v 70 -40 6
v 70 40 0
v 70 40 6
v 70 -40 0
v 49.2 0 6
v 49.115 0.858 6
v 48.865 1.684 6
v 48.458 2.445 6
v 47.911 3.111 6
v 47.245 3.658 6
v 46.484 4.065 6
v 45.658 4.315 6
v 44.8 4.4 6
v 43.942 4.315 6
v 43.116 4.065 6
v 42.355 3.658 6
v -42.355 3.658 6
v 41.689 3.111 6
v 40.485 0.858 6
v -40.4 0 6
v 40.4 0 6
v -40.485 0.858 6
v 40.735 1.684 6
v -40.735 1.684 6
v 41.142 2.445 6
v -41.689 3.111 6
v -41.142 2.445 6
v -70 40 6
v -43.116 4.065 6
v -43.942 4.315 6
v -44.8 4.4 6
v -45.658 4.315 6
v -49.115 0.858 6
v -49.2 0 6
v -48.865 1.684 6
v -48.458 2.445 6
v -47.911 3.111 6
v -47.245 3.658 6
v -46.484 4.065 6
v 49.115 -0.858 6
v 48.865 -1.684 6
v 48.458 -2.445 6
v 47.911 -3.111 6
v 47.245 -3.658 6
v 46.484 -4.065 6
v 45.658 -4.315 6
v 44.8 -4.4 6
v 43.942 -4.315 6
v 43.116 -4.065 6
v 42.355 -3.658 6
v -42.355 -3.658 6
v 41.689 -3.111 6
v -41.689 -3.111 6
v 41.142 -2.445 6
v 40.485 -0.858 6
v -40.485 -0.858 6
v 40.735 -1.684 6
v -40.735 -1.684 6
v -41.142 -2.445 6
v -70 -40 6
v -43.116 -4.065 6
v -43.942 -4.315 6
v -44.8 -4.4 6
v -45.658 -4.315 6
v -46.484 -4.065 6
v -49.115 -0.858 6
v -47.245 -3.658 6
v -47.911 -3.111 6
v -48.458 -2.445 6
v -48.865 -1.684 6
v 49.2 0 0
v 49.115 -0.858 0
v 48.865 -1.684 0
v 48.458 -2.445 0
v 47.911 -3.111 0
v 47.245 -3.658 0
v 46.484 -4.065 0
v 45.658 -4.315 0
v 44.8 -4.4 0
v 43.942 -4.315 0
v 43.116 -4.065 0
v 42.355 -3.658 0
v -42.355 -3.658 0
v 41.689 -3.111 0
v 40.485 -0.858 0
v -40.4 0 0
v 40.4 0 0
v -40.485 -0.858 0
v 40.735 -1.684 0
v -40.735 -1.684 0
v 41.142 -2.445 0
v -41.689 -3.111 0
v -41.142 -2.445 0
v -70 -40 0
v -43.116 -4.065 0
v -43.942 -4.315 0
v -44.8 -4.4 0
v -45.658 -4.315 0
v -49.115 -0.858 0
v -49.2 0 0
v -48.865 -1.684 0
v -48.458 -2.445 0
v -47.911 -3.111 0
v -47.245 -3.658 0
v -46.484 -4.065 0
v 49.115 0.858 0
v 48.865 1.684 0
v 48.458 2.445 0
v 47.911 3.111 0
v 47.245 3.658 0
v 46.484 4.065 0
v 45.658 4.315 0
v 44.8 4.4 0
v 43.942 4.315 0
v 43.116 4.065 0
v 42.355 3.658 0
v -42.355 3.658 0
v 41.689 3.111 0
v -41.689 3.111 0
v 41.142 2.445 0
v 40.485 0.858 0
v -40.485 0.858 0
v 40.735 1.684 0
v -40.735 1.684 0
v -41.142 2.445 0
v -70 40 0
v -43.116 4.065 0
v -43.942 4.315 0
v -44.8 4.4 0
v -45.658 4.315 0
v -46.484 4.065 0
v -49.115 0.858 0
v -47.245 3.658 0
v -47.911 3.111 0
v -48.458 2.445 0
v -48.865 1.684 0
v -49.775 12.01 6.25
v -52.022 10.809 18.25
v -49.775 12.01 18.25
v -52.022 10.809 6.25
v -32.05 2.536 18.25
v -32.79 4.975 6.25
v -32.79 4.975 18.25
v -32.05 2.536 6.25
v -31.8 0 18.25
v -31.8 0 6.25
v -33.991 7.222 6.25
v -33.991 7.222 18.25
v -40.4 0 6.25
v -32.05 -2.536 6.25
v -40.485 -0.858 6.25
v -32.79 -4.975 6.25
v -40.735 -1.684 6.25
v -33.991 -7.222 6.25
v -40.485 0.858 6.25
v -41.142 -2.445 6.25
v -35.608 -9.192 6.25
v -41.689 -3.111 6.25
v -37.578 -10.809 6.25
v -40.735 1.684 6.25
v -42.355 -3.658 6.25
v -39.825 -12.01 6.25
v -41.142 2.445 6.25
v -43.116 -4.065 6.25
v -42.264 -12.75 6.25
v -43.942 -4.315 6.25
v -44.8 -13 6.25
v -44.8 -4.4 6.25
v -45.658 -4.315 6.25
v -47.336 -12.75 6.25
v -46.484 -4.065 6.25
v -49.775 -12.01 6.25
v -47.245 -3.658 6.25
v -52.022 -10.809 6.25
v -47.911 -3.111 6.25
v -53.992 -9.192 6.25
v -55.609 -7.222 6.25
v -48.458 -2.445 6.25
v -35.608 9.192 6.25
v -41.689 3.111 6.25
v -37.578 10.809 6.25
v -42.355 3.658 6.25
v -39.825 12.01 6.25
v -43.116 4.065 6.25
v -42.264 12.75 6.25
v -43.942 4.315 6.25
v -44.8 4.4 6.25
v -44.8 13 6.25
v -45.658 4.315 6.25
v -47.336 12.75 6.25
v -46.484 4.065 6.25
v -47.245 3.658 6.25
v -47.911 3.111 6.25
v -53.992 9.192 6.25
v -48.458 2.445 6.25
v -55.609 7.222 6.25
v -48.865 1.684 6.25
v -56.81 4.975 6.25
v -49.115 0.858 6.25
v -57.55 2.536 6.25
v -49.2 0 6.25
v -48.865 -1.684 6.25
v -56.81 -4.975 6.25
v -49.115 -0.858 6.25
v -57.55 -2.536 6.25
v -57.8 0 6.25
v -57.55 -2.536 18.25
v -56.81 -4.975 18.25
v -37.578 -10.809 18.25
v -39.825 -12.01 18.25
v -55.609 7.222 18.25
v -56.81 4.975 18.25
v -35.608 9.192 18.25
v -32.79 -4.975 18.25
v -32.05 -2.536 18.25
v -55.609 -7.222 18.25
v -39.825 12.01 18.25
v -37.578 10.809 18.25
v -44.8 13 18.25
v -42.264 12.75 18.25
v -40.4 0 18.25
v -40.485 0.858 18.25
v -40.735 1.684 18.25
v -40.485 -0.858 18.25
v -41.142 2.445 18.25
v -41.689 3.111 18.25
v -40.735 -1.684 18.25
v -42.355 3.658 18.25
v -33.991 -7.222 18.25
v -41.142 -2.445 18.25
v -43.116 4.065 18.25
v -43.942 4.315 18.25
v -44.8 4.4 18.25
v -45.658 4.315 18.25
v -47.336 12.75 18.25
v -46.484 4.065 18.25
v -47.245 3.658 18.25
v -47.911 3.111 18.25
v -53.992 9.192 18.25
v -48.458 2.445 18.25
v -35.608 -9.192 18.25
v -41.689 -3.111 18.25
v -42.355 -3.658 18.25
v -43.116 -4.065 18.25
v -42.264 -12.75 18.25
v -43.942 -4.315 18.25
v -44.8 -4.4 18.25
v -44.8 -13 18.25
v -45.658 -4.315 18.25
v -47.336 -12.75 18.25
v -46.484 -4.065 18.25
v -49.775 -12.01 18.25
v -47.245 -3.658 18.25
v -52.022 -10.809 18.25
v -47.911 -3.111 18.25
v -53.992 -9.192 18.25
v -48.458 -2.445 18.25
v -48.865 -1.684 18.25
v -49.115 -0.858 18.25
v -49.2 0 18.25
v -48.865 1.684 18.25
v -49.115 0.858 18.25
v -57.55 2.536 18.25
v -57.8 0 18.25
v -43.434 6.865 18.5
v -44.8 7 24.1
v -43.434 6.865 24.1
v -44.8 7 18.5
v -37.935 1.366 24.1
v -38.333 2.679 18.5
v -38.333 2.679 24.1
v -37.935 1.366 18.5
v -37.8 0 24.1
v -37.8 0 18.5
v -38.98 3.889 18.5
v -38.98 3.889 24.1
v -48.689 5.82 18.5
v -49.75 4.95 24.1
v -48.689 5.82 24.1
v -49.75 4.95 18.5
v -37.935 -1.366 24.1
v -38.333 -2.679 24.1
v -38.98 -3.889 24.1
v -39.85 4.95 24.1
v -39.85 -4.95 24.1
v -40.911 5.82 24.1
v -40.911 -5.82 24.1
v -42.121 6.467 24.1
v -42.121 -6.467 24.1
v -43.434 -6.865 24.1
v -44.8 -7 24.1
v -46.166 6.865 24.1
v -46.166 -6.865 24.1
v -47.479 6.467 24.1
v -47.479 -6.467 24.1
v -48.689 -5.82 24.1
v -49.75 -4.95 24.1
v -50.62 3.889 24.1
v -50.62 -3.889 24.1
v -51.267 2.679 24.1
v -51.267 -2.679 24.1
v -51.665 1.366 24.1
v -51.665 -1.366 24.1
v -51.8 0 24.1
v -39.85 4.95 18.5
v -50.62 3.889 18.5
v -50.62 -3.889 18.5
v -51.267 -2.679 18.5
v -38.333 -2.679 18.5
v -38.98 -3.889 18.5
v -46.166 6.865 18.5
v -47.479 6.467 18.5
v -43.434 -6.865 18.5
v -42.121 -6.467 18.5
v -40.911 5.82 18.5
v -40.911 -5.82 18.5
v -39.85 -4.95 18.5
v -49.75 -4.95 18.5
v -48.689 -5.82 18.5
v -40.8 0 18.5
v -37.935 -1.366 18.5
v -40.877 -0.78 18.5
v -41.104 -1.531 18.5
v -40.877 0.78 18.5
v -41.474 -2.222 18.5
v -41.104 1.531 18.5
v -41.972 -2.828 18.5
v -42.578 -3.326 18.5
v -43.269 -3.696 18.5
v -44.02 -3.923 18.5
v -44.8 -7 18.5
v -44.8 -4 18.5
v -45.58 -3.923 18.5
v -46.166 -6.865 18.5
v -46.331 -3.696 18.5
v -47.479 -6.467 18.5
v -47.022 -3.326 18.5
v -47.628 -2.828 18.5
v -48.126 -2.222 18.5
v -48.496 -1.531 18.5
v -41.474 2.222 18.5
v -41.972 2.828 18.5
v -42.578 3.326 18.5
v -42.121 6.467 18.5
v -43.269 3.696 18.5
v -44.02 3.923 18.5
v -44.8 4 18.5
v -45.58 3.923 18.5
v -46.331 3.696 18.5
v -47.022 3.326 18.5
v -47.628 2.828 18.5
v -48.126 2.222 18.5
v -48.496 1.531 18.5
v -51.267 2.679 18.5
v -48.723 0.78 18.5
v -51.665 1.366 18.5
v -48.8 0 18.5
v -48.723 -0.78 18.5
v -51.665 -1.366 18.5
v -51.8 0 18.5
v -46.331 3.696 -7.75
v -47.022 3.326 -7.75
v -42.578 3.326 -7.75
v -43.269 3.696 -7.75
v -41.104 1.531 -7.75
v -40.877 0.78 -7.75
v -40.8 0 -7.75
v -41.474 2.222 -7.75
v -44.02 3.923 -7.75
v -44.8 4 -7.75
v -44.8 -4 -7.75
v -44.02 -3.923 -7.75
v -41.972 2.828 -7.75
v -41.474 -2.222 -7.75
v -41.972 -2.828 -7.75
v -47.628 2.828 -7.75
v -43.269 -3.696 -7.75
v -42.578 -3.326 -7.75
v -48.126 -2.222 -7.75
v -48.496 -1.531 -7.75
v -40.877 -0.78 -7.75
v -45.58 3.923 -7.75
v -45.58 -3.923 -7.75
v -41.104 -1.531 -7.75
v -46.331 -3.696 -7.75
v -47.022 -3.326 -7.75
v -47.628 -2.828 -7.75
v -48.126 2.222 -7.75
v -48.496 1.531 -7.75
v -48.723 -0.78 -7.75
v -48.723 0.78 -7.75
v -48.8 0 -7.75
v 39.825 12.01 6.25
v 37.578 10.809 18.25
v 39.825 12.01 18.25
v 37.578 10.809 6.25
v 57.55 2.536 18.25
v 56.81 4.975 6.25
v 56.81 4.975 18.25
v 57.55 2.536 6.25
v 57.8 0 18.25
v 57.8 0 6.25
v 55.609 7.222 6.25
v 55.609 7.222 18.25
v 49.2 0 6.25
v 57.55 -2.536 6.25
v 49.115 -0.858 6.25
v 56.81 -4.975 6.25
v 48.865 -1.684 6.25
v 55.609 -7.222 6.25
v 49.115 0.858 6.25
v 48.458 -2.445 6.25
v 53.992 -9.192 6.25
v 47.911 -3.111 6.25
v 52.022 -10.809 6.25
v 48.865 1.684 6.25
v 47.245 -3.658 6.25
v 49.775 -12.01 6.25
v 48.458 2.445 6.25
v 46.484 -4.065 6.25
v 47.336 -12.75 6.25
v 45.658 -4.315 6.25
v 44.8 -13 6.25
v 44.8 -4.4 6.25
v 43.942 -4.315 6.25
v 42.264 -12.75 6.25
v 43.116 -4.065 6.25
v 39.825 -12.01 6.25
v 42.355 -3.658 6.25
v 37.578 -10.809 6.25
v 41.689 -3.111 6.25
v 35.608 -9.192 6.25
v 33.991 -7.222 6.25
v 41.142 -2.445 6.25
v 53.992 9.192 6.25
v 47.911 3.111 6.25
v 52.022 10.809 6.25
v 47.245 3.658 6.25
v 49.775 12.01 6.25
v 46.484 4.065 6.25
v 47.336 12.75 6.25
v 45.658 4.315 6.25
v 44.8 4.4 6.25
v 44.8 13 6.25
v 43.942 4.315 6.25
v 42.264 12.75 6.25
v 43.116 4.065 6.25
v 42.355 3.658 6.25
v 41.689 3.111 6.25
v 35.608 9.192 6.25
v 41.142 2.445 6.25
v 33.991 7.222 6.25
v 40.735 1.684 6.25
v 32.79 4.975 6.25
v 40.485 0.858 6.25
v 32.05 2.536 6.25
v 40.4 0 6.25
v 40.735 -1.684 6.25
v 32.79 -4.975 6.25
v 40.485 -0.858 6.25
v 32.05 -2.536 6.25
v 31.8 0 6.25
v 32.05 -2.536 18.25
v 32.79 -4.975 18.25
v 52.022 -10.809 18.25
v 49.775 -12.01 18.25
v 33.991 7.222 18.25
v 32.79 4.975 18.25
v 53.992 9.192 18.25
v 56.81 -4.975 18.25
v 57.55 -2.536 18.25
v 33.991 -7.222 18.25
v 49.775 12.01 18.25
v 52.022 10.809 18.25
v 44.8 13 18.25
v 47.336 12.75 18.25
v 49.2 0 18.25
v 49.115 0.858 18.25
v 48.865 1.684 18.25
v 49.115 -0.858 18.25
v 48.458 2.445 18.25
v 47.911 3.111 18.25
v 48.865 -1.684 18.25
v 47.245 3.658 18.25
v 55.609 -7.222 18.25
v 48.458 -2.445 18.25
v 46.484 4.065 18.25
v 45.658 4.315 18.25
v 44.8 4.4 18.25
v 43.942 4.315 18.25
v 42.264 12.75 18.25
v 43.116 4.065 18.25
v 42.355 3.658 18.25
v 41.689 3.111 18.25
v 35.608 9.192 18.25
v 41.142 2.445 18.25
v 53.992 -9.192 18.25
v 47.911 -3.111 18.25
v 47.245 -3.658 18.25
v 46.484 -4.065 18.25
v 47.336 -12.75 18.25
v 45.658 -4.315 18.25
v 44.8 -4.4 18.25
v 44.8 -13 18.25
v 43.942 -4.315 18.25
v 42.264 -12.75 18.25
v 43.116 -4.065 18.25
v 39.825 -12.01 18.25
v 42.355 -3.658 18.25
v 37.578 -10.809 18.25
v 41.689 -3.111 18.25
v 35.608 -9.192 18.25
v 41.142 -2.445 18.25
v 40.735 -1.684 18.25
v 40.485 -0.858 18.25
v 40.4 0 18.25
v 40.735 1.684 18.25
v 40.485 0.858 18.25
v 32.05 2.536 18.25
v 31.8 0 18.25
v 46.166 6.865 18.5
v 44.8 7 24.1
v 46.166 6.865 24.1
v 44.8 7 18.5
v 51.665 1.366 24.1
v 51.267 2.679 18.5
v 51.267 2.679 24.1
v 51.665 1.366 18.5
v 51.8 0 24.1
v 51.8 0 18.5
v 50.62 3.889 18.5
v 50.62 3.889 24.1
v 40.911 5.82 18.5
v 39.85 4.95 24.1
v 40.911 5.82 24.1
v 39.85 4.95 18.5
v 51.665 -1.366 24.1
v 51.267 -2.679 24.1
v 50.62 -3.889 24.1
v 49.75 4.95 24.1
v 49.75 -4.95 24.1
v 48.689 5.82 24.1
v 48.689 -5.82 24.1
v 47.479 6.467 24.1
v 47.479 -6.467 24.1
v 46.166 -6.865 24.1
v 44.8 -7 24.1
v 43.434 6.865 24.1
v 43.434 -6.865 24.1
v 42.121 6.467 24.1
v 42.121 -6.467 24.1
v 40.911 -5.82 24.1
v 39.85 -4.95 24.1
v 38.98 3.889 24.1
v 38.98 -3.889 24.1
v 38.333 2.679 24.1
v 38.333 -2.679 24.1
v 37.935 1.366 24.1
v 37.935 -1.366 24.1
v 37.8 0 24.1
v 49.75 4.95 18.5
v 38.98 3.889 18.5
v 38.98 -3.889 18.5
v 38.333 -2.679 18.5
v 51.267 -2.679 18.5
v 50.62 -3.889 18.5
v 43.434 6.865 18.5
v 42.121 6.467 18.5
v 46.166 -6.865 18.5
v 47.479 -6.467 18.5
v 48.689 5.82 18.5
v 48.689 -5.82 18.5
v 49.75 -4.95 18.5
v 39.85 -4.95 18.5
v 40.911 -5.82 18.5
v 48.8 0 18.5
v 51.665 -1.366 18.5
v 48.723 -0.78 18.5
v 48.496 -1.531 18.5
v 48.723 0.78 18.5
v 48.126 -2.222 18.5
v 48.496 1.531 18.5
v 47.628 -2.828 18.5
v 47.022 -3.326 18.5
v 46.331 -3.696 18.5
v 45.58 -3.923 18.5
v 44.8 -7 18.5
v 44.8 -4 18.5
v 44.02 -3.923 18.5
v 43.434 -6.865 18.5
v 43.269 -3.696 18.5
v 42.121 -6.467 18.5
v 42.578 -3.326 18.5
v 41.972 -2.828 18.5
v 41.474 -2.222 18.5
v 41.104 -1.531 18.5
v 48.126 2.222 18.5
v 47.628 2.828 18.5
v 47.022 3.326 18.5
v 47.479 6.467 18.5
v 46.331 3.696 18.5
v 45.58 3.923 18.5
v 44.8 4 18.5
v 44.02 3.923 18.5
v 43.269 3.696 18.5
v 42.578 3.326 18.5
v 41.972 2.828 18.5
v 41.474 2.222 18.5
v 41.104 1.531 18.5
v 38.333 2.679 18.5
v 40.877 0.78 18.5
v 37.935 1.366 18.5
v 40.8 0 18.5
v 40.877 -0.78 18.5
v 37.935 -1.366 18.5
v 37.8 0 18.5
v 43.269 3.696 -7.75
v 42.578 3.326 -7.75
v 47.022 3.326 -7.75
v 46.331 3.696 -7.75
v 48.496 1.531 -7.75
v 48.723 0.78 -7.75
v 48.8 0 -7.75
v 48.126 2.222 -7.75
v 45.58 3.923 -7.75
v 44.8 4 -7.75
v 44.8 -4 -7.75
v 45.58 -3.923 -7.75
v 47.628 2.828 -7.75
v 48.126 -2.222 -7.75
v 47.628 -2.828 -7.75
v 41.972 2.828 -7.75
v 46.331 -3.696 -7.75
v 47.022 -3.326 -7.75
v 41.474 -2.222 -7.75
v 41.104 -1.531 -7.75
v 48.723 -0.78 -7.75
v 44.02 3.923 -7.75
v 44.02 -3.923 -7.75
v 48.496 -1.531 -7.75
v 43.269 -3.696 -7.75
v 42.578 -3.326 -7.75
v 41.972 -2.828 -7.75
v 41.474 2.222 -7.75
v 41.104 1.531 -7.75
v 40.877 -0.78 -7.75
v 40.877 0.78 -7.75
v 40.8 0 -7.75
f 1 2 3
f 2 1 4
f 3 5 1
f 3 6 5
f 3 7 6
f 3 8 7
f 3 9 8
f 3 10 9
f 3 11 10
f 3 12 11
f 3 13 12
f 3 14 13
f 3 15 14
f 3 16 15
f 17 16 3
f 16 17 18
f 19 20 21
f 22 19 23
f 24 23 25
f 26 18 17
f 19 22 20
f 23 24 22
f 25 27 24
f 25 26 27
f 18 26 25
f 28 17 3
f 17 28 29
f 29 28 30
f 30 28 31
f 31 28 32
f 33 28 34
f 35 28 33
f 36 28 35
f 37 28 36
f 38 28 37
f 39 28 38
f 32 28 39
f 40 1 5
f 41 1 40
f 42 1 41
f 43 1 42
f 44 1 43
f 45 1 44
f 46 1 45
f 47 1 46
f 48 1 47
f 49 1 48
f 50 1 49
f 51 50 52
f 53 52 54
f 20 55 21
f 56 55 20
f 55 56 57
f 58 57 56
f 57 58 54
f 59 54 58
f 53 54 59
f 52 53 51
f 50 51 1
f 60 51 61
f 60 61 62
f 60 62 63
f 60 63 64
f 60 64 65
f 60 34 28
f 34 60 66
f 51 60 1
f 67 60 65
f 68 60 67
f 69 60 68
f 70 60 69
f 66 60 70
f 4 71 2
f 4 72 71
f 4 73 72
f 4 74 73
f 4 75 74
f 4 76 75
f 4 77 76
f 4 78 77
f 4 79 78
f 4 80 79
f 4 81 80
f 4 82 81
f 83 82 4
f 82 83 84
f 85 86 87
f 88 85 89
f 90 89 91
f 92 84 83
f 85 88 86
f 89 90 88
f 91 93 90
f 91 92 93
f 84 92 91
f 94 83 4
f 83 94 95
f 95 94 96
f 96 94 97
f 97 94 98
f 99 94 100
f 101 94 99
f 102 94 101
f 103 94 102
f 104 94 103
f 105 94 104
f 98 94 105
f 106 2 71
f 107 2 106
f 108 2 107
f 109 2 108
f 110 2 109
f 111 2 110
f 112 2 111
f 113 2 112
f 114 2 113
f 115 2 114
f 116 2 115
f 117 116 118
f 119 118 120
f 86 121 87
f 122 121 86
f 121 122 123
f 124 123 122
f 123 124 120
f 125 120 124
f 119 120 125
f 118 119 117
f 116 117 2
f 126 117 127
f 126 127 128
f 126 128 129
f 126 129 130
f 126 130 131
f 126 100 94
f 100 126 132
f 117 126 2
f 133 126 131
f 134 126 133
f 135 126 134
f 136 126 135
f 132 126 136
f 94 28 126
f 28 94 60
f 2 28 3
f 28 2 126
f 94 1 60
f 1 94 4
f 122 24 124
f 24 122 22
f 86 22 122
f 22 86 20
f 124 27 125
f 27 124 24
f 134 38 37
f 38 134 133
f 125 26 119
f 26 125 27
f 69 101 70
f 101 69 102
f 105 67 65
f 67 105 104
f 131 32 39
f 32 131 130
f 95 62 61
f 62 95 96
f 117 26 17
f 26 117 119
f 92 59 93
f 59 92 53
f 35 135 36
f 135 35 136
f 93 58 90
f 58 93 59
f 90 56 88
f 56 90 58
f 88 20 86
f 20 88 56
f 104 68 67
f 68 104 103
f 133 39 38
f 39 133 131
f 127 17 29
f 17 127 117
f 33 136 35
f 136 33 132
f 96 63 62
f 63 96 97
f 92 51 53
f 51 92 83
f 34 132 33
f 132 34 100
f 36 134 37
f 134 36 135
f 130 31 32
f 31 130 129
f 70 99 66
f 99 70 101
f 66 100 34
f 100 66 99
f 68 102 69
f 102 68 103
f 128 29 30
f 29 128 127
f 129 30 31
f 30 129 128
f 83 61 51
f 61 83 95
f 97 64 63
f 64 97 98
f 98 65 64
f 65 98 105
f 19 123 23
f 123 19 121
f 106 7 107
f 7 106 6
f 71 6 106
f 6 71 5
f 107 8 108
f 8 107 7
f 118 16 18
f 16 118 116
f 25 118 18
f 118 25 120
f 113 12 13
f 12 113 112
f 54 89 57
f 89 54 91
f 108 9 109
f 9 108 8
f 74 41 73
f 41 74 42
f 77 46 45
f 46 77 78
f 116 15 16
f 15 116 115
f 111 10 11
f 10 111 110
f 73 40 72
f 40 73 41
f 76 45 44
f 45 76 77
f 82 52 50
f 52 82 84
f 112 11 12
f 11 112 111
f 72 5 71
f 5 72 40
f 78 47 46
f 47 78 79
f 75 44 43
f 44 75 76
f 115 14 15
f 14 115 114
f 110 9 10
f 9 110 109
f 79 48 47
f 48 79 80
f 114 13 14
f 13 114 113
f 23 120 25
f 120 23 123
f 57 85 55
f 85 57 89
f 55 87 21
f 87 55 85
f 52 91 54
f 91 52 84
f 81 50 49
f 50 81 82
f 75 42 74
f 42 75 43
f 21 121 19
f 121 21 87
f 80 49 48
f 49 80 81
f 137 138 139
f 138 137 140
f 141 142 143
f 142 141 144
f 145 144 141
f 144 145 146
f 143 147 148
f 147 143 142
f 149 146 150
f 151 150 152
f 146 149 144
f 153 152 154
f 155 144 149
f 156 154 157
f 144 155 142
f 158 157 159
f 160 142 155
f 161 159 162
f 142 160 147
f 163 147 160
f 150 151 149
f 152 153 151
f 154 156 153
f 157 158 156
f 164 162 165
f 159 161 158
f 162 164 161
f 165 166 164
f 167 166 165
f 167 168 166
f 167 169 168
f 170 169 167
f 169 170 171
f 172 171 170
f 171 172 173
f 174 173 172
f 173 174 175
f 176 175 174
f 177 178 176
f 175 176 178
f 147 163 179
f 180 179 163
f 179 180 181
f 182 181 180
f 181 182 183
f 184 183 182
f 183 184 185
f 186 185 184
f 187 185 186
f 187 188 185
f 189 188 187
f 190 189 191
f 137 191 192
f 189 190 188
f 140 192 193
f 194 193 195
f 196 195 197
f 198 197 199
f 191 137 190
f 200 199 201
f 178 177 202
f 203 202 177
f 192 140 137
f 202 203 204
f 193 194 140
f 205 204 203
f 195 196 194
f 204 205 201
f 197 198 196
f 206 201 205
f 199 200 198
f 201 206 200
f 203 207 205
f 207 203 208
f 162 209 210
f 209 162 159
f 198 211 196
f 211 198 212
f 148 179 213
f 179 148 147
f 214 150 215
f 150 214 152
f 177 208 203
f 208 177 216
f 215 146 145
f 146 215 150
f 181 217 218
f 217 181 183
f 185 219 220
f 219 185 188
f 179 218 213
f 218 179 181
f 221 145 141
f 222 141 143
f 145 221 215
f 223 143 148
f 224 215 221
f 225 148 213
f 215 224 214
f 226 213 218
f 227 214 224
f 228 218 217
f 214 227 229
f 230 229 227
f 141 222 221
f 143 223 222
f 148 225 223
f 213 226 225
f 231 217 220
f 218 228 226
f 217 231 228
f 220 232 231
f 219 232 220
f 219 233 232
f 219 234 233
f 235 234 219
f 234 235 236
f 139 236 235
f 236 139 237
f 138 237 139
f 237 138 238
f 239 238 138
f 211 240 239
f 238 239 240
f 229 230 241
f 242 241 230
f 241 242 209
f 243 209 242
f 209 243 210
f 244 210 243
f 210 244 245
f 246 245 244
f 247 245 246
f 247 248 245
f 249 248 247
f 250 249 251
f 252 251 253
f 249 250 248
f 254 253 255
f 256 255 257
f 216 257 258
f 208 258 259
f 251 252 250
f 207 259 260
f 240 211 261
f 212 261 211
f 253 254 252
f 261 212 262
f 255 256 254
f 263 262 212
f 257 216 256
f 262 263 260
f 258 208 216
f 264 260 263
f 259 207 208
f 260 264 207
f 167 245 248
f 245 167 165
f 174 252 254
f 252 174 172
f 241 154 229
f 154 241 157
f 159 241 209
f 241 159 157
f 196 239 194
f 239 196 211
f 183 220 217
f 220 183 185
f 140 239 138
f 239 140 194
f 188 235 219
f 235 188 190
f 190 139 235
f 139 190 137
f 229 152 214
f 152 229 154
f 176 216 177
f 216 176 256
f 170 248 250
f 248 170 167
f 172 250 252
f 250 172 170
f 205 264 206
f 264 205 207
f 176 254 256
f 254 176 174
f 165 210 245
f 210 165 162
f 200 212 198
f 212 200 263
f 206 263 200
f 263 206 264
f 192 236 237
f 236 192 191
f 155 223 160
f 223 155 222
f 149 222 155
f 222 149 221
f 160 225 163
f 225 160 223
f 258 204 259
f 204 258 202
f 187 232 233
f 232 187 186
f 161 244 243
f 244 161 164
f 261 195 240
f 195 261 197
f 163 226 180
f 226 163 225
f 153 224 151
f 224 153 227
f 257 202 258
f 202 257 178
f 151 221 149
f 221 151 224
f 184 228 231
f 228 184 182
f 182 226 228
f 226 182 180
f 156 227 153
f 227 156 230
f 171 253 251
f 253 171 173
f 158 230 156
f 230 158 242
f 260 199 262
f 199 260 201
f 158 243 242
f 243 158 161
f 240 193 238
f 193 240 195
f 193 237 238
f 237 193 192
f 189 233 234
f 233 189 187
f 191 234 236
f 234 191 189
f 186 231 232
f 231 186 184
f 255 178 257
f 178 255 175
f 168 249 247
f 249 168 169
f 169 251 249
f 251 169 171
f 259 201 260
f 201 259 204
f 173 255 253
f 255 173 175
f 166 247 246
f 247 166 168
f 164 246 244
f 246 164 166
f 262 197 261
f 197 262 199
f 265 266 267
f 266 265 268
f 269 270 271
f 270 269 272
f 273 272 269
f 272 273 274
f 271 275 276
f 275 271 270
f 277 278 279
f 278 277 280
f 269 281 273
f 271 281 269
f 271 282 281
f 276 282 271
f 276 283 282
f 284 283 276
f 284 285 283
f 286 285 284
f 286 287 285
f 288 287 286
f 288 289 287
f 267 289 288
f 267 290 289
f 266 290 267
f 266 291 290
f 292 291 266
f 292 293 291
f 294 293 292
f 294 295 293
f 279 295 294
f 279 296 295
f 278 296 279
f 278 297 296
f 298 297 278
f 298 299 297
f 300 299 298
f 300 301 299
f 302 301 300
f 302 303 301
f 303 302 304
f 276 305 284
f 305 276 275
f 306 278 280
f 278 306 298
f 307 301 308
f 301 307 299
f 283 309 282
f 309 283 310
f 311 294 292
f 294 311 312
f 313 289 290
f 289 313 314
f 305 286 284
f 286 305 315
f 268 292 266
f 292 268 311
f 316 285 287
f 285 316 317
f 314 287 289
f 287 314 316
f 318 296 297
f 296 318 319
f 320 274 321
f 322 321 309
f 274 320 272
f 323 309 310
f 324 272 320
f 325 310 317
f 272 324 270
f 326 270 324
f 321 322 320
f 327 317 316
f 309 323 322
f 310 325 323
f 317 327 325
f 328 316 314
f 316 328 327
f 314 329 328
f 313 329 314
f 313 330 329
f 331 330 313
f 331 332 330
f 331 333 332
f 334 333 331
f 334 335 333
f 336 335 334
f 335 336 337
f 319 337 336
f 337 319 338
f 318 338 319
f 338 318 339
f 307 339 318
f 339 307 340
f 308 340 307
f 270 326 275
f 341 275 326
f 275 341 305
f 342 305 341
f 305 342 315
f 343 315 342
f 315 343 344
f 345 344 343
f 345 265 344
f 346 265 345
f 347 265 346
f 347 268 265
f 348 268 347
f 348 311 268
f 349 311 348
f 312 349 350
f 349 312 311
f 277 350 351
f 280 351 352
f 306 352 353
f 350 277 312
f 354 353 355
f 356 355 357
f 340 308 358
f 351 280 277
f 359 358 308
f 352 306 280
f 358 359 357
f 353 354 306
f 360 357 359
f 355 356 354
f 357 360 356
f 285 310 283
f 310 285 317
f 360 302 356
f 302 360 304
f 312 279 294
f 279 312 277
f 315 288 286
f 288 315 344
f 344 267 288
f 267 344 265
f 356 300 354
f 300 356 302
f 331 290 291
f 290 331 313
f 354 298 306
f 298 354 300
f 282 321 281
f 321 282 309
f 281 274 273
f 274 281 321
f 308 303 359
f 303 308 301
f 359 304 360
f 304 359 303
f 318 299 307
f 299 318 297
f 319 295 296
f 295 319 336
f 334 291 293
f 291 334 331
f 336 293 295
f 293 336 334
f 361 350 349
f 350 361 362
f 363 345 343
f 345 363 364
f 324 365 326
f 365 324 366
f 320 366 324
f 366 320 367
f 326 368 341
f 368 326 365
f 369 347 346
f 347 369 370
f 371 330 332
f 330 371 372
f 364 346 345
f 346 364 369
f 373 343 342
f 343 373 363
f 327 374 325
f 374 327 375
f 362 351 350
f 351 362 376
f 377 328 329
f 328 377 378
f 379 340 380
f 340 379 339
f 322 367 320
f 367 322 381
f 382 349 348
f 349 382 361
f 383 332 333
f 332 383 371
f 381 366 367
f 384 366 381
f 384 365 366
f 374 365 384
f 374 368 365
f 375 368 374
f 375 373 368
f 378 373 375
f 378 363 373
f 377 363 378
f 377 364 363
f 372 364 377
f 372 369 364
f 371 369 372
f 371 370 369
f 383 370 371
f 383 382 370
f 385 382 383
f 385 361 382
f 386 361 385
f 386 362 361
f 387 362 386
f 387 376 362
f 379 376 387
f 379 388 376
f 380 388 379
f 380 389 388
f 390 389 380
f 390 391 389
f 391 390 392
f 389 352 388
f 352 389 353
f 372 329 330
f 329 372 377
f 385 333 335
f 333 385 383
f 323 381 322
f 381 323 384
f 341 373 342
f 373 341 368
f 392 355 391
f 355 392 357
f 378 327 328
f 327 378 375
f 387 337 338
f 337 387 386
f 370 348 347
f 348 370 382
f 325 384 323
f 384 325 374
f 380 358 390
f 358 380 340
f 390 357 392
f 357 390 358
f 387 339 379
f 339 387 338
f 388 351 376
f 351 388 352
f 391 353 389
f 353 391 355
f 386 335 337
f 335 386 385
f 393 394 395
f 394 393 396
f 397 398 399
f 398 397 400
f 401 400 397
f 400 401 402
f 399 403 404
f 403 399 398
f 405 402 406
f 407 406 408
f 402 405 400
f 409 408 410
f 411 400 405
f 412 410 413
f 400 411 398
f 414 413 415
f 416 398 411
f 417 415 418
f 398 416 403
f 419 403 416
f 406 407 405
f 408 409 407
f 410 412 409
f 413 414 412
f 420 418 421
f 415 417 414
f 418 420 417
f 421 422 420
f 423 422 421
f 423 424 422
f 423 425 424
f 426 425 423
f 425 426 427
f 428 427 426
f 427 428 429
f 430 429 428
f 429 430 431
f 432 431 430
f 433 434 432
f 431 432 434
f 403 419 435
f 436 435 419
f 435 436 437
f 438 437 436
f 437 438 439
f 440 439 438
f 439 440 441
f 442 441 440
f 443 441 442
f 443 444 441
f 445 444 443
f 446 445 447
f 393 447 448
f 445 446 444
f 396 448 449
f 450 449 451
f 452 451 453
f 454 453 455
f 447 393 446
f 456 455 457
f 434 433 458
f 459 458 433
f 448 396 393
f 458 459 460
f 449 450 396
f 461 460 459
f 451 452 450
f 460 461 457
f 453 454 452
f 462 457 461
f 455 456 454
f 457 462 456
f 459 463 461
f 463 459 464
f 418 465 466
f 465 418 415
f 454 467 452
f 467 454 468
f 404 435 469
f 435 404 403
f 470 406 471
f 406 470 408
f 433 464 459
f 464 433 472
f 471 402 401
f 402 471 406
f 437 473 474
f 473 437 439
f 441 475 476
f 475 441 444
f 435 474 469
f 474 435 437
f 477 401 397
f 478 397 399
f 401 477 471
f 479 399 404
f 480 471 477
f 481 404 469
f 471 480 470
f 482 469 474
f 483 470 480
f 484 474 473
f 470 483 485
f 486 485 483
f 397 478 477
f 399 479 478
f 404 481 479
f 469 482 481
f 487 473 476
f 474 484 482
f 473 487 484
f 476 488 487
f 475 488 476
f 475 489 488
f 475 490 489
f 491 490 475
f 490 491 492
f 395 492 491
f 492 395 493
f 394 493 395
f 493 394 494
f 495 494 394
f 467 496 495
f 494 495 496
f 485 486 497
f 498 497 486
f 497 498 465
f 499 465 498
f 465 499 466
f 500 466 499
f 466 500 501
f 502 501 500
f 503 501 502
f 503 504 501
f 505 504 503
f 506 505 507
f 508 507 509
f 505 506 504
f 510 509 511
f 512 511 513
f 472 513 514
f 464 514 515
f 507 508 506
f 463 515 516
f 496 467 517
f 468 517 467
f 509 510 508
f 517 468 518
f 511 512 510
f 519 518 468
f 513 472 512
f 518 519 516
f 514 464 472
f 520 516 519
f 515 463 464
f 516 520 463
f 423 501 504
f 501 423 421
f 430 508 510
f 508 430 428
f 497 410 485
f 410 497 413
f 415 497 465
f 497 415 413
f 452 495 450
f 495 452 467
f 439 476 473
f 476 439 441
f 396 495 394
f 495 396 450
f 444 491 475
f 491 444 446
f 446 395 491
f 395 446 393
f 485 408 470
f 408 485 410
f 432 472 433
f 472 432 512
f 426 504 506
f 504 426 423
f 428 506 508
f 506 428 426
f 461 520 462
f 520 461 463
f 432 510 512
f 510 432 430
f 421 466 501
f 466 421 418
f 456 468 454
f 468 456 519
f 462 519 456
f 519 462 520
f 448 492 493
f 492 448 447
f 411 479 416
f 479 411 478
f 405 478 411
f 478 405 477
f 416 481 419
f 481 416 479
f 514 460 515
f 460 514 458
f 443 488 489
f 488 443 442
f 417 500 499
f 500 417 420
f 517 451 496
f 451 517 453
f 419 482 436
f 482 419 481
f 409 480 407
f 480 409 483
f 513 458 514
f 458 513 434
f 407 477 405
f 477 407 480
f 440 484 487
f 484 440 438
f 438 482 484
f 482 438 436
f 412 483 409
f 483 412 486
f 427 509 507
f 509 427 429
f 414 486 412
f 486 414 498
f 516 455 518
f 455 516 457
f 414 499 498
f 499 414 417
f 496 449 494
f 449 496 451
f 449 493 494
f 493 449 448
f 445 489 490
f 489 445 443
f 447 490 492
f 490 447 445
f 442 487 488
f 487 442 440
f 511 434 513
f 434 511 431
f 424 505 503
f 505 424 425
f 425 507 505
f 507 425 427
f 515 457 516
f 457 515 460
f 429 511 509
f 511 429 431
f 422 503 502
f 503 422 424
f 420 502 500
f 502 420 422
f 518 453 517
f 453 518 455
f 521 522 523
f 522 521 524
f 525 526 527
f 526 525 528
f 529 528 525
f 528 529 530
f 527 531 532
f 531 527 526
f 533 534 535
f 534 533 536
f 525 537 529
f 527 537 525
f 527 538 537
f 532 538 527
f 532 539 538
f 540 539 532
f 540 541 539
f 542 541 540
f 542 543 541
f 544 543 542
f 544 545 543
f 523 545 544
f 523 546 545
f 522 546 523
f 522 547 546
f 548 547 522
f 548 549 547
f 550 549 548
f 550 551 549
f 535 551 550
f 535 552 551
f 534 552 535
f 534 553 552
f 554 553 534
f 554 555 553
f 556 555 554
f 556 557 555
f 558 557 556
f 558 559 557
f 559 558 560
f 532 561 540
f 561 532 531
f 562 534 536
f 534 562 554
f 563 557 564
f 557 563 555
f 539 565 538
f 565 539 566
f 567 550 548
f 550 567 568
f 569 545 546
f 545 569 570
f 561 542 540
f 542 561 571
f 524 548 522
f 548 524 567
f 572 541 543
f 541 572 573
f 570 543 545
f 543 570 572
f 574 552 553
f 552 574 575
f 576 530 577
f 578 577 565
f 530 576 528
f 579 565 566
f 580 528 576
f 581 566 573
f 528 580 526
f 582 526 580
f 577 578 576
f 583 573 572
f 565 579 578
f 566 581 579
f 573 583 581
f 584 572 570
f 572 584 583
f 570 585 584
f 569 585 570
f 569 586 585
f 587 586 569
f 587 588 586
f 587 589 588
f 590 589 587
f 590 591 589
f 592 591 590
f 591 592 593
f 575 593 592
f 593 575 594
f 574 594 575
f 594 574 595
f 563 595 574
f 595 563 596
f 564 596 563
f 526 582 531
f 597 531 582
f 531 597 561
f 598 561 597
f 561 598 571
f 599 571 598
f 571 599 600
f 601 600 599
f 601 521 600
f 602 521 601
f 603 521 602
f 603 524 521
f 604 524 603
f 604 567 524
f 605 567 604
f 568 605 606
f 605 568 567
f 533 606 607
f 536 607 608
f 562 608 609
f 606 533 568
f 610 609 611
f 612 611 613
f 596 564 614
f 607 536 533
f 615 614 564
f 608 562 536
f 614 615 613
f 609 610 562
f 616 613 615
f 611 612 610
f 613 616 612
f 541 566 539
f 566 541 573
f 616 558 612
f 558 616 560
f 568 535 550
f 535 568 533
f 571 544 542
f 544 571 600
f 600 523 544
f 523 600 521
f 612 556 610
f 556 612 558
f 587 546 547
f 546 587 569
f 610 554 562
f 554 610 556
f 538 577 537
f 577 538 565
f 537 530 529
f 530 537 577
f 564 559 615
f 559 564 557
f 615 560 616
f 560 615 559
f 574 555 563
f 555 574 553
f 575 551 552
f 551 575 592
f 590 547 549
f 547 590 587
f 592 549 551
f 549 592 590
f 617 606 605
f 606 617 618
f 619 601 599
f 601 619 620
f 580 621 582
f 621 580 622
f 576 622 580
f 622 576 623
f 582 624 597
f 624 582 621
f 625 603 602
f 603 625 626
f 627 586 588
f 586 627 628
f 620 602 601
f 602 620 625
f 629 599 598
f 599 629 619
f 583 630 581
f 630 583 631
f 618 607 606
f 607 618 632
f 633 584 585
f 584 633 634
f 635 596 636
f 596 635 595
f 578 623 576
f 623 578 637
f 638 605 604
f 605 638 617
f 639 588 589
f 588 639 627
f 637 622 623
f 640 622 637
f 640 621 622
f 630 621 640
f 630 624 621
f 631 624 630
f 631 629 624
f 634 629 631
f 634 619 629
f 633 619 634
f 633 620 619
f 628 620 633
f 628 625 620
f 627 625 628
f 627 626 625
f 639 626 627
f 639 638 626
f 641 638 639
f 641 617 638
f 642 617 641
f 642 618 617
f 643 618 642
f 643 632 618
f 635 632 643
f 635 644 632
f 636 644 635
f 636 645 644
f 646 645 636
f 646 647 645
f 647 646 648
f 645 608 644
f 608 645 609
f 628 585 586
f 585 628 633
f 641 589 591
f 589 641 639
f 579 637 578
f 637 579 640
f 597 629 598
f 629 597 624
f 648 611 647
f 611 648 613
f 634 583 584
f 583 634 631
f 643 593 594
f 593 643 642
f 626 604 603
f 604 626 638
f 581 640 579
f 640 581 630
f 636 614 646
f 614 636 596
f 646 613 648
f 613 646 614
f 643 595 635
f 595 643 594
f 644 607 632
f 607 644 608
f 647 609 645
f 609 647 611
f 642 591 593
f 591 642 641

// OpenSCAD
$fn = 32;

// ------------------------------------------------------------------------
// Standoff columns: 2 d26 standoffs, bolts d8
// Every part is its own module, assembly() places them once.
// ------------------------------------------------------------------------

// --- part 1 ---
module base_plate() {
  difference() {
    translate([-70, -40, 0]) cube([140, 80, 6]);
    translate([-44.8, 0, -1]) cylinder(h = 8, d = 8.8);
    translate([44.8, 0, -1]) cylinder(h = 8, d = 8.8);
  }
}

// --- part 2 ---
module spacer1() {
  difference() {
      translate([0, 0, 0]) cylinder(h = 12, d = 26);
      translate([0, 0, -1]) cylinder(h = 14, d = 8.8);
    }
}

// --- part 3 ---
module bolt1() {
  cylinder(h = 5.6, d = 14);
  translate([0, 0, -26.25]) cylinder(h = 26.25, d = 8);
}

// --- part 4 ---
module spacer2() {
  difference() {
      translate([0, 0, 0]) cylinder(h = 12, d = 26);
      translate([0, 0, -1]) cylinder(h = 14, d = 8.8);
    }
}

// --- part 5 ---
module bolt2() {
  cylinder(h = 5.6, d = 14);
  translate([0, 0, -26.25]) cylinder(h = 26.25, d = 8);
}

// --- assembly ---
module assembly() {
  translate([0, 0, 0]) rotate([0, 0, 0]) base_plate();
  translate([-44.8, 0, 6.25]) rotate([0, 0, 0]) spacer1();
  translate([-44.8, 0, 18.5]) rotate([0, 0, 0]) bolt1();
  translate([44.8, 0, 6.25]) rotate([0, 0, 0]) spacer2();
  translate([44.8, 0, 18.5]) rotate([0, 0, 0]) bolt2();
}

assembly();
